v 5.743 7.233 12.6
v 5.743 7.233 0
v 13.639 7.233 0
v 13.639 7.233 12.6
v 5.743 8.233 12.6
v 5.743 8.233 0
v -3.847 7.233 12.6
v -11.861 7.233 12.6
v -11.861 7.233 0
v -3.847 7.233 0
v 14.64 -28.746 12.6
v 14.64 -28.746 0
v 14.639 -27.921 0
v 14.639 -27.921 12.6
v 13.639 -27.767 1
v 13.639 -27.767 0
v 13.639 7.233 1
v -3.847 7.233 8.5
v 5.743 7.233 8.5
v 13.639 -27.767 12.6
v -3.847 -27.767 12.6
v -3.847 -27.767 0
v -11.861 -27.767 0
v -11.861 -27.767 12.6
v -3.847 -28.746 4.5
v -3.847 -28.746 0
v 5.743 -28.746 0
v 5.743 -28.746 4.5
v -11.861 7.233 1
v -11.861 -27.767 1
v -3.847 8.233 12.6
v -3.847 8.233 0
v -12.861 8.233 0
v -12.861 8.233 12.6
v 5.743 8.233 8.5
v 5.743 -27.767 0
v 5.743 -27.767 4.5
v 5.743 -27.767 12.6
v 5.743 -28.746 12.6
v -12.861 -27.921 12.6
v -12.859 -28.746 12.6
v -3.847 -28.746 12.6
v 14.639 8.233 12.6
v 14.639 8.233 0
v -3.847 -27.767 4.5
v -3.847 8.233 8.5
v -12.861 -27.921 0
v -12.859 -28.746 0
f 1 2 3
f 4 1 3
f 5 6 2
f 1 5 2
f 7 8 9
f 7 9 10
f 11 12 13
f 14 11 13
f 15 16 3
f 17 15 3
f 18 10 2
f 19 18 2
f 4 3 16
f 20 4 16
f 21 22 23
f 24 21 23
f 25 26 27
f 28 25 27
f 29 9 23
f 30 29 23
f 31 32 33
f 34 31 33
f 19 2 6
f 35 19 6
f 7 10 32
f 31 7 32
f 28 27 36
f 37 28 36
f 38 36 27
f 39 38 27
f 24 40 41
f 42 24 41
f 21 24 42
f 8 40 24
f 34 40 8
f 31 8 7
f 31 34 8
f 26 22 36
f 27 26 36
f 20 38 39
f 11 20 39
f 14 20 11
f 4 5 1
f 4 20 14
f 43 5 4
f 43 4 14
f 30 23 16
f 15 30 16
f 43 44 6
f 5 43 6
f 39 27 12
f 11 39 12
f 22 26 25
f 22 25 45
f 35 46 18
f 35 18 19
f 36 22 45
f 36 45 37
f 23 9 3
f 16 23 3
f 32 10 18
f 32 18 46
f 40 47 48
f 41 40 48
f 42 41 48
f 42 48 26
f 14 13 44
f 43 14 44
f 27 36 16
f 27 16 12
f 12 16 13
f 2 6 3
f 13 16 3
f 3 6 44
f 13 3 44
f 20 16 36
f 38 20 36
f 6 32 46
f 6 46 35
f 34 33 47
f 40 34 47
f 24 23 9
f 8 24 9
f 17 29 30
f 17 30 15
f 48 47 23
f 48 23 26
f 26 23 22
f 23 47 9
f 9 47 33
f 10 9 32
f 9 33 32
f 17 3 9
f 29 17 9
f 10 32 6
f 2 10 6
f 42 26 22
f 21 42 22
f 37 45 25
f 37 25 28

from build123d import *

# Parameters (mm, degrees)
F1_DEPTH = 12.6
F2_DEPTH = 12.6
F0_W     = 9.590229
F0_H     = 0.979104
F3_DEPTH = 4.5
F0_H_2   = 1
F4_DEPTH = 8.5
F5_DEPTH = 1


with BuildPart() as f1:
    # F0 (on Top) → F1 (new body)
    with BuildSketch(Plane.XY):
        Polygon((5.743297, 8.233304), (5.743297, 7.233304), (13.638665, 7.233304), (13.638665, -27.766696), (5.743297, -27.766696), (5.743297, -28.7458), (14.640459, -28.7458), (14.638665, -27.921008), (14.638665, 8.233304), (13.620233, 8.233304), align=None)
    extrude(amount=F1_DEPTH)


with BuildPart() as f2:
    # F0 (on Top) → F2 (new body)
    with BuildSketch(Plane.XY):
        Polygon((-11.861335, -27.766696), (-11.861335, 7.233304), (-3.846932, 7.233304), (-3.846932, 8.233304), (-12.861335, 8.233304), (-12.861335, -27.921008), (-12.859039, -28.7458), (-3.846932, -28.7458), (-3.846932, -27.766696), align=None)
    extrude(amount=F2_DEPTH)


with BuildPart() as f3:
    # F0 (on Top) → F3 (new body)
    with BuildSketch(Plane.XY):
        with Locations((0.948183, -28.256248)):
            Rectangle(F0_W, F0_H)
    extrude(amount=F3_DEPTH)


with BuildPart() as f4:
    # F0 (on Top) → F4 (new body)
    with BuildSketch(Plane.XY):
        with Locations((0.948183, 7.733304)):
            Rectangle(F0_W, F0_H_2)
    extrude(amount=F4_DEPTH)


with BuildPart() as f5:
    # F0 (on Top) → F5 (new body)
    with BuildSketch(Plane.XY):
        Polygon((-3.846932, 7.233304), (-11.861335, 7.233304), (-11.861335, -27.766696), (-3.846932, -27.766696), (5.743297, -27.766696), (13.638665, -27.766696), (13.638665, 7.233304), (5.743297, 7.233304), align=None)
    extrude(amount=F5_DEPTH)


solid = Compound([f1.part, f2.part, f3.part, f4.part, f5.part])
